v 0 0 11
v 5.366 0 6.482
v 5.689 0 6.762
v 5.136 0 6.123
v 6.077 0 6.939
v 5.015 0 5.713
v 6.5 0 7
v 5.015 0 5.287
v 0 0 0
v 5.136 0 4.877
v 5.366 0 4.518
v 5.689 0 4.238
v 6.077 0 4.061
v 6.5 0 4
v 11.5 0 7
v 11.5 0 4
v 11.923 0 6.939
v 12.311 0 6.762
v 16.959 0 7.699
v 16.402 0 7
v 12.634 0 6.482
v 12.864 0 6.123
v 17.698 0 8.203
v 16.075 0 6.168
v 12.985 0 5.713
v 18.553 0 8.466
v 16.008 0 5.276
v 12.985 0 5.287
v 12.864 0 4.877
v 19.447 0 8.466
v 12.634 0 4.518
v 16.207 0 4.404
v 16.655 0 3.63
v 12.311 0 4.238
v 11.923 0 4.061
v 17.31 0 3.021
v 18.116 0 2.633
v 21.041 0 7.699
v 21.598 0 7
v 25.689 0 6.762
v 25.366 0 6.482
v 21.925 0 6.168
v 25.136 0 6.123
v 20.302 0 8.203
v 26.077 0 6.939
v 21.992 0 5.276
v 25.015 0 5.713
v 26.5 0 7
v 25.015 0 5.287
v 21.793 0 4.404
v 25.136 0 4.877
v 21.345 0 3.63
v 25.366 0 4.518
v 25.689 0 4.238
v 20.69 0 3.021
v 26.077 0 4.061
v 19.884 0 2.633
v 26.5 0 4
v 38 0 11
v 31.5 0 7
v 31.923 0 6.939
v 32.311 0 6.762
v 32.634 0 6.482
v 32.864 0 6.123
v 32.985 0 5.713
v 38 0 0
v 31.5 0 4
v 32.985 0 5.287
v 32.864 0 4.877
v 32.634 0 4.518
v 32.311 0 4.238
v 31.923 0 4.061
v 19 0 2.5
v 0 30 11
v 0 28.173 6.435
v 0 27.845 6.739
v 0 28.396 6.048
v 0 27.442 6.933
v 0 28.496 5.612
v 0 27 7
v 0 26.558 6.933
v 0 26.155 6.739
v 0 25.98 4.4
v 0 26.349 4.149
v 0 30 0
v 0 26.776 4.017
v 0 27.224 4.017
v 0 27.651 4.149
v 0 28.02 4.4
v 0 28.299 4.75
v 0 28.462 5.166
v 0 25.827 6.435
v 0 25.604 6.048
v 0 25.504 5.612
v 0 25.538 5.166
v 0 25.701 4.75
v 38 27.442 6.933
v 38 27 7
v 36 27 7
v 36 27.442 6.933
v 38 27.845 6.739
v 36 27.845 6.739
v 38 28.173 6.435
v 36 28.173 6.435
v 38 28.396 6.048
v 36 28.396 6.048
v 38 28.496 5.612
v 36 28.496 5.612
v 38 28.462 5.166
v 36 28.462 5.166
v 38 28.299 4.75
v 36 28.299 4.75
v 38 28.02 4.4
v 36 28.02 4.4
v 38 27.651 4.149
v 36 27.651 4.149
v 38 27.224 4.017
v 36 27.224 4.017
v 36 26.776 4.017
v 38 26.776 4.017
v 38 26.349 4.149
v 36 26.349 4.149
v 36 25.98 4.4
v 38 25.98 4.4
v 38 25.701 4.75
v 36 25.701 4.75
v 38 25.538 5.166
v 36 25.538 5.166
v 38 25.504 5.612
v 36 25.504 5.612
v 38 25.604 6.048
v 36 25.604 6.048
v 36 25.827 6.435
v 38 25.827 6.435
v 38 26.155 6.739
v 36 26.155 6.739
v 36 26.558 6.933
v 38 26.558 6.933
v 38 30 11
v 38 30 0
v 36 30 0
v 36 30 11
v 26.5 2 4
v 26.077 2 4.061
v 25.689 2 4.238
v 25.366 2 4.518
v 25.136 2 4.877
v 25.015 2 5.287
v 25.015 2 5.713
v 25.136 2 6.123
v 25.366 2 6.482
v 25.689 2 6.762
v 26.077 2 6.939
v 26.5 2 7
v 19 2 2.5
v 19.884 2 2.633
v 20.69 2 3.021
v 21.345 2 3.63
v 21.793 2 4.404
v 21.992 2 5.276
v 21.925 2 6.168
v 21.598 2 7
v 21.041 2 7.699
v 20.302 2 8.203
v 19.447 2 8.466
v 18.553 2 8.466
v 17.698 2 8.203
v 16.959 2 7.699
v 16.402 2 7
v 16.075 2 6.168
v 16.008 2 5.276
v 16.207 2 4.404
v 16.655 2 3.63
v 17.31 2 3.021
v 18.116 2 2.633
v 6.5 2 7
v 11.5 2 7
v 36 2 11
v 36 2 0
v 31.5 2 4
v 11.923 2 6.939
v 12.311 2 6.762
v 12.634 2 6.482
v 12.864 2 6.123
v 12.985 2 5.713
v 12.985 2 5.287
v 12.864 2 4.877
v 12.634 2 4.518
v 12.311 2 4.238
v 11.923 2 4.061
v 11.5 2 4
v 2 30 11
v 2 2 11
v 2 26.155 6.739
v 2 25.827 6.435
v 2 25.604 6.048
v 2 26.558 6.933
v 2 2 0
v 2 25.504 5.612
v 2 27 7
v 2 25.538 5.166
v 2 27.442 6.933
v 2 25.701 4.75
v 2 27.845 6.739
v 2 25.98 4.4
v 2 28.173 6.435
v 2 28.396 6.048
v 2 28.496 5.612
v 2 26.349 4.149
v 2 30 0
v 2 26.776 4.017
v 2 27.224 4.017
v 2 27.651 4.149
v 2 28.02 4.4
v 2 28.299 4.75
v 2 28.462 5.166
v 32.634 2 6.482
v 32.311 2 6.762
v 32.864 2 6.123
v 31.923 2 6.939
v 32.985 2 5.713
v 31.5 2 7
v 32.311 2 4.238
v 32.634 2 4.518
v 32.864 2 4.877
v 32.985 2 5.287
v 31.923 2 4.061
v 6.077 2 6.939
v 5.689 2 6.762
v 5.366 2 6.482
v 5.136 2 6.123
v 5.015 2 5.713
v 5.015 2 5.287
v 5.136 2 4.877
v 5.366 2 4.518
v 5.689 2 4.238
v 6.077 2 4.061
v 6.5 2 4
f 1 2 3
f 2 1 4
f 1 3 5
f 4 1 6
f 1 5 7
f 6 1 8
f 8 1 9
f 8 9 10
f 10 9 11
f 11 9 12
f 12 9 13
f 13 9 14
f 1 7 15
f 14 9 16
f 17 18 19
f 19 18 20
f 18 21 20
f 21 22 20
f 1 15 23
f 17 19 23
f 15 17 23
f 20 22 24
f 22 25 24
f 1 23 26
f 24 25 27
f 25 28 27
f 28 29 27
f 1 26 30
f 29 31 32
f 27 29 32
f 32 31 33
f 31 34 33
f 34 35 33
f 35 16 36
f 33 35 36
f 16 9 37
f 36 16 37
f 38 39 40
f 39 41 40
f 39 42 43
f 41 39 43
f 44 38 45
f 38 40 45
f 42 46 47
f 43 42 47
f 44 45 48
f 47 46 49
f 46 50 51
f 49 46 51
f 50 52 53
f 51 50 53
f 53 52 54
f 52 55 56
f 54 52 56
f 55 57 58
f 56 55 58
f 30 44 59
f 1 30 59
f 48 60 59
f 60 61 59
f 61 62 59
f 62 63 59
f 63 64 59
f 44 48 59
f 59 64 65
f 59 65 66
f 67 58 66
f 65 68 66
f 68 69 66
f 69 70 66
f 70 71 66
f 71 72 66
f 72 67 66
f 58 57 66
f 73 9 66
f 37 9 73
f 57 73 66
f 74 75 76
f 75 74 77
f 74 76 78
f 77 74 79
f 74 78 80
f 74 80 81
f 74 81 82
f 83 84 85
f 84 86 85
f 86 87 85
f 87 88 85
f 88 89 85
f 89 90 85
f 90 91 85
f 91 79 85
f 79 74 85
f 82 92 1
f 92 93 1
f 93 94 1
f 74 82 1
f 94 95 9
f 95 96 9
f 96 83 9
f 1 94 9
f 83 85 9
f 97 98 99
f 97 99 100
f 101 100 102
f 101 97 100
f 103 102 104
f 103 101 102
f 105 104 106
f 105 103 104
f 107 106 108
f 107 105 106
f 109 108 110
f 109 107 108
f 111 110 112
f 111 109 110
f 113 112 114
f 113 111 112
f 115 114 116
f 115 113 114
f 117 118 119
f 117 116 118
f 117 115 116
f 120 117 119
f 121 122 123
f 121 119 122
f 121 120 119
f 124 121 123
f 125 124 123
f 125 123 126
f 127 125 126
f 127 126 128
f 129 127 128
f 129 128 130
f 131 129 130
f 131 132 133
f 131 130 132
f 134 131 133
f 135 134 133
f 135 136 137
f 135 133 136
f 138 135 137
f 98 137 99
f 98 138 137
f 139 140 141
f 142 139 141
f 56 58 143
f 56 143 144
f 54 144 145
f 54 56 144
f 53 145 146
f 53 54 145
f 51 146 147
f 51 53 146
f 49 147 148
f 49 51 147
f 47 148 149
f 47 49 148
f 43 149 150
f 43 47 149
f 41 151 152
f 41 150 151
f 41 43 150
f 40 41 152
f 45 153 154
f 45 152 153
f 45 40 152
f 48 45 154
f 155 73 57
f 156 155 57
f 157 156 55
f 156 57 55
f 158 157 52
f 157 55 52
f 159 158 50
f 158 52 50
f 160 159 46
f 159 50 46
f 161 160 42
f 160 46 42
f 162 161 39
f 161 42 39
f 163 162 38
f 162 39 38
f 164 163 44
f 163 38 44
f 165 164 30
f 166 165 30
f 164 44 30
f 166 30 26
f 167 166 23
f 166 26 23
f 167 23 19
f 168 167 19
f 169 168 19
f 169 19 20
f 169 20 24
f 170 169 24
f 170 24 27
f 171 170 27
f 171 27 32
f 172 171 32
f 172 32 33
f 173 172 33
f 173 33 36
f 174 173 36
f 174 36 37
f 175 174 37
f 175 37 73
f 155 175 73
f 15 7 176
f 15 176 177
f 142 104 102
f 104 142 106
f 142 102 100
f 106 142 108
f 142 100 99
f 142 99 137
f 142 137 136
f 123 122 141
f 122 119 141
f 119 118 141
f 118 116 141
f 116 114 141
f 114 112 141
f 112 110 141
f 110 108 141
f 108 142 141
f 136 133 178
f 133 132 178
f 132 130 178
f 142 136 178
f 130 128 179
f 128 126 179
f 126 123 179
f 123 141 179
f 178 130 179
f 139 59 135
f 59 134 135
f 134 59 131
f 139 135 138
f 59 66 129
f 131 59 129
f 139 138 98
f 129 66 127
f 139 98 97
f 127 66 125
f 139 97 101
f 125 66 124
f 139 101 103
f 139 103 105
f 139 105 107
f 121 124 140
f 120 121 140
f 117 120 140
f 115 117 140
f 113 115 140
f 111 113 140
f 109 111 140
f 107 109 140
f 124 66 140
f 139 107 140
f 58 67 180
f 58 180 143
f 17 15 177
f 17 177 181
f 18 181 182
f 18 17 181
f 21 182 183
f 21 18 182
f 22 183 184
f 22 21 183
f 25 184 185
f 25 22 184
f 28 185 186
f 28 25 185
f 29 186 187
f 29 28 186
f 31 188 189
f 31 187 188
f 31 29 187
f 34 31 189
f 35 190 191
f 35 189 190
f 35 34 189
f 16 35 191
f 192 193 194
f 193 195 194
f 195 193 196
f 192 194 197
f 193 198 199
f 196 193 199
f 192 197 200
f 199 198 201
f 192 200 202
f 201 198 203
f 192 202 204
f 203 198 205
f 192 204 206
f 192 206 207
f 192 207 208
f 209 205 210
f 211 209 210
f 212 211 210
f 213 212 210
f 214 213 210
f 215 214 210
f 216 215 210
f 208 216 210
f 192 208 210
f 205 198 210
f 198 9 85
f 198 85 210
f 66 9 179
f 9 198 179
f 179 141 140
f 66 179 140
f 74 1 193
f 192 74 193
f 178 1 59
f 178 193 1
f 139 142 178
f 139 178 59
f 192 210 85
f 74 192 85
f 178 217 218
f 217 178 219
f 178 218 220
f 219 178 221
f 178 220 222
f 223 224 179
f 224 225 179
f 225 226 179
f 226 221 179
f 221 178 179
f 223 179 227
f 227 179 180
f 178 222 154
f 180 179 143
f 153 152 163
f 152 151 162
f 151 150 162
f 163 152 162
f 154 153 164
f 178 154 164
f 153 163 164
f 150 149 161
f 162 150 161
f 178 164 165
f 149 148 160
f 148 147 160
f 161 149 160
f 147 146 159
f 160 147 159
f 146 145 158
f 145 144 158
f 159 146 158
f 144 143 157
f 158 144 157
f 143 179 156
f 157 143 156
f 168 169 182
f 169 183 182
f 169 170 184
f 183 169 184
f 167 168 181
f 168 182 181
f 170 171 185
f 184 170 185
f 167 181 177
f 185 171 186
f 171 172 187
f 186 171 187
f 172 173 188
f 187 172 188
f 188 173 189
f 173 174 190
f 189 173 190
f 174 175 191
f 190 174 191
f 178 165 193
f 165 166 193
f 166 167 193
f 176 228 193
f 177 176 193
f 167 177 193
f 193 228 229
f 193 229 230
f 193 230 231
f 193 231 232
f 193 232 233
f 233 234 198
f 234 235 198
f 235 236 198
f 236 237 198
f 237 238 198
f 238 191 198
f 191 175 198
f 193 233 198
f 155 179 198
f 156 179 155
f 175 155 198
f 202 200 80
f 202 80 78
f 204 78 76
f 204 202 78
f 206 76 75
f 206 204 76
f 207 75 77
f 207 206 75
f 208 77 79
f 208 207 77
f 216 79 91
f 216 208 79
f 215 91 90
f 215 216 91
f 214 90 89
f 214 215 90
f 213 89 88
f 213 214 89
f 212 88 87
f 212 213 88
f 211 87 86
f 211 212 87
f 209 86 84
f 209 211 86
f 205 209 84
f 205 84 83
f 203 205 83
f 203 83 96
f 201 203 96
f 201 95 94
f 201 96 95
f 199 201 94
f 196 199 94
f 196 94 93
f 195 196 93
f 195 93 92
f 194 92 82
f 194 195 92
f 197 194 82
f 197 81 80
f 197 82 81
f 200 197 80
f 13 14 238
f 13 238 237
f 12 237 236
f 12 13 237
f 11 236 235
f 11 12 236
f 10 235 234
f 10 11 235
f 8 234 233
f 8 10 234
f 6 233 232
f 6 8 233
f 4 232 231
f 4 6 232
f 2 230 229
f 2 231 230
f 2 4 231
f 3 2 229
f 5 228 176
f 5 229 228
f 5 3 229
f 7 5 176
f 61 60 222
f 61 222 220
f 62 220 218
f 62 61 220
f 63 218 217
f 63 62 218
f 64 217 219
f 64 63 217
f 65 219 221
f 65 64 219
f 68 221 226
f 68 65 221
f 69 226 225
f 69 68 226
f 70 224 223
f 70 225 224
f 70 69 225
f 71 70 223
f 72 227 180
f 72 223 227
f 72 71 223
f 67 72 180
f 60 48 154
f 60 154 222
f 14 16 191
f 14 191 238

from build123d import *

# Parameters (mm, degrees)
EXTRUDE_1_DEPTH          = 11
CUT_EXTRUDE_1_DEPTH      = 50.648766349
CUT_EXTRUDE_1_DEPTH_BACK = 50.648766349
SKETCH_3_R               = 1.5
SKETCH_4_R               = 3
CUT_EXTRUDE_2_DEPTH      = 3


with BuildPart() as part:
    # 草图2 → 凸台-拉伸1 (new body)
    with BuildSketch(Plane.XY):
        Polygon((0, 30), (0, 0), (38, 0), (38, 30), (36, 30), (36, 2), (2, 2), (2, 30), align=None)
    extrude(amount=EXTRUDE_1_DEPTH)

    # 草图3 → 切除-拉伸1 (cut, two sides: drawn at the far end of the back side and taken through both)
    with BuildSketch(Plane.ZY.offset(-CUT_EXTRUDE_1_DEPTH_BACK)):
        with Locations((5.5, 27)):
            Circle(SKETCH_3_R)
    extrude(amount=CUT_EXTRUDE_1_DEPTH + CUT_EXTRUDE_1_DEPTH_BACK, mode=Mode.SUBTRACT)

    # 草图4 → 切除-拉伸2 (cut)
    with BuildSketch(Plane.XZ):
        with Locations(Location((19, 5.5, 0), (0, 0, 270))):
            Circle(SKETCH_4_R)
        with BuildLine():
            Line((26.5, 7), (31.5, 7))
            ThreePointArc((31.5, 7), (33, 5.5), (31.5, 4))
            Line((31.5, 4), (26.5, 4))
            ThreePointArc((26.5, 4), (25, 5.5), (26.5, 7))
        make_face()
        with BuildLine():
            Line((6.5, 7), (11.5, 7))
            ThreePointArc((11.5, 7), (13, 5.5), (11.5, 4))
            Line((11.5, 4), (6.5, 4))
            ThreePointArc((6.5, 4), (5, 5.5), (6.5, 7))
        make_face()
    extrude(amount=-CUT_EXTRUDE_2_DEPTH, mode=Mode.SUBTRACT)


solid = part.part
